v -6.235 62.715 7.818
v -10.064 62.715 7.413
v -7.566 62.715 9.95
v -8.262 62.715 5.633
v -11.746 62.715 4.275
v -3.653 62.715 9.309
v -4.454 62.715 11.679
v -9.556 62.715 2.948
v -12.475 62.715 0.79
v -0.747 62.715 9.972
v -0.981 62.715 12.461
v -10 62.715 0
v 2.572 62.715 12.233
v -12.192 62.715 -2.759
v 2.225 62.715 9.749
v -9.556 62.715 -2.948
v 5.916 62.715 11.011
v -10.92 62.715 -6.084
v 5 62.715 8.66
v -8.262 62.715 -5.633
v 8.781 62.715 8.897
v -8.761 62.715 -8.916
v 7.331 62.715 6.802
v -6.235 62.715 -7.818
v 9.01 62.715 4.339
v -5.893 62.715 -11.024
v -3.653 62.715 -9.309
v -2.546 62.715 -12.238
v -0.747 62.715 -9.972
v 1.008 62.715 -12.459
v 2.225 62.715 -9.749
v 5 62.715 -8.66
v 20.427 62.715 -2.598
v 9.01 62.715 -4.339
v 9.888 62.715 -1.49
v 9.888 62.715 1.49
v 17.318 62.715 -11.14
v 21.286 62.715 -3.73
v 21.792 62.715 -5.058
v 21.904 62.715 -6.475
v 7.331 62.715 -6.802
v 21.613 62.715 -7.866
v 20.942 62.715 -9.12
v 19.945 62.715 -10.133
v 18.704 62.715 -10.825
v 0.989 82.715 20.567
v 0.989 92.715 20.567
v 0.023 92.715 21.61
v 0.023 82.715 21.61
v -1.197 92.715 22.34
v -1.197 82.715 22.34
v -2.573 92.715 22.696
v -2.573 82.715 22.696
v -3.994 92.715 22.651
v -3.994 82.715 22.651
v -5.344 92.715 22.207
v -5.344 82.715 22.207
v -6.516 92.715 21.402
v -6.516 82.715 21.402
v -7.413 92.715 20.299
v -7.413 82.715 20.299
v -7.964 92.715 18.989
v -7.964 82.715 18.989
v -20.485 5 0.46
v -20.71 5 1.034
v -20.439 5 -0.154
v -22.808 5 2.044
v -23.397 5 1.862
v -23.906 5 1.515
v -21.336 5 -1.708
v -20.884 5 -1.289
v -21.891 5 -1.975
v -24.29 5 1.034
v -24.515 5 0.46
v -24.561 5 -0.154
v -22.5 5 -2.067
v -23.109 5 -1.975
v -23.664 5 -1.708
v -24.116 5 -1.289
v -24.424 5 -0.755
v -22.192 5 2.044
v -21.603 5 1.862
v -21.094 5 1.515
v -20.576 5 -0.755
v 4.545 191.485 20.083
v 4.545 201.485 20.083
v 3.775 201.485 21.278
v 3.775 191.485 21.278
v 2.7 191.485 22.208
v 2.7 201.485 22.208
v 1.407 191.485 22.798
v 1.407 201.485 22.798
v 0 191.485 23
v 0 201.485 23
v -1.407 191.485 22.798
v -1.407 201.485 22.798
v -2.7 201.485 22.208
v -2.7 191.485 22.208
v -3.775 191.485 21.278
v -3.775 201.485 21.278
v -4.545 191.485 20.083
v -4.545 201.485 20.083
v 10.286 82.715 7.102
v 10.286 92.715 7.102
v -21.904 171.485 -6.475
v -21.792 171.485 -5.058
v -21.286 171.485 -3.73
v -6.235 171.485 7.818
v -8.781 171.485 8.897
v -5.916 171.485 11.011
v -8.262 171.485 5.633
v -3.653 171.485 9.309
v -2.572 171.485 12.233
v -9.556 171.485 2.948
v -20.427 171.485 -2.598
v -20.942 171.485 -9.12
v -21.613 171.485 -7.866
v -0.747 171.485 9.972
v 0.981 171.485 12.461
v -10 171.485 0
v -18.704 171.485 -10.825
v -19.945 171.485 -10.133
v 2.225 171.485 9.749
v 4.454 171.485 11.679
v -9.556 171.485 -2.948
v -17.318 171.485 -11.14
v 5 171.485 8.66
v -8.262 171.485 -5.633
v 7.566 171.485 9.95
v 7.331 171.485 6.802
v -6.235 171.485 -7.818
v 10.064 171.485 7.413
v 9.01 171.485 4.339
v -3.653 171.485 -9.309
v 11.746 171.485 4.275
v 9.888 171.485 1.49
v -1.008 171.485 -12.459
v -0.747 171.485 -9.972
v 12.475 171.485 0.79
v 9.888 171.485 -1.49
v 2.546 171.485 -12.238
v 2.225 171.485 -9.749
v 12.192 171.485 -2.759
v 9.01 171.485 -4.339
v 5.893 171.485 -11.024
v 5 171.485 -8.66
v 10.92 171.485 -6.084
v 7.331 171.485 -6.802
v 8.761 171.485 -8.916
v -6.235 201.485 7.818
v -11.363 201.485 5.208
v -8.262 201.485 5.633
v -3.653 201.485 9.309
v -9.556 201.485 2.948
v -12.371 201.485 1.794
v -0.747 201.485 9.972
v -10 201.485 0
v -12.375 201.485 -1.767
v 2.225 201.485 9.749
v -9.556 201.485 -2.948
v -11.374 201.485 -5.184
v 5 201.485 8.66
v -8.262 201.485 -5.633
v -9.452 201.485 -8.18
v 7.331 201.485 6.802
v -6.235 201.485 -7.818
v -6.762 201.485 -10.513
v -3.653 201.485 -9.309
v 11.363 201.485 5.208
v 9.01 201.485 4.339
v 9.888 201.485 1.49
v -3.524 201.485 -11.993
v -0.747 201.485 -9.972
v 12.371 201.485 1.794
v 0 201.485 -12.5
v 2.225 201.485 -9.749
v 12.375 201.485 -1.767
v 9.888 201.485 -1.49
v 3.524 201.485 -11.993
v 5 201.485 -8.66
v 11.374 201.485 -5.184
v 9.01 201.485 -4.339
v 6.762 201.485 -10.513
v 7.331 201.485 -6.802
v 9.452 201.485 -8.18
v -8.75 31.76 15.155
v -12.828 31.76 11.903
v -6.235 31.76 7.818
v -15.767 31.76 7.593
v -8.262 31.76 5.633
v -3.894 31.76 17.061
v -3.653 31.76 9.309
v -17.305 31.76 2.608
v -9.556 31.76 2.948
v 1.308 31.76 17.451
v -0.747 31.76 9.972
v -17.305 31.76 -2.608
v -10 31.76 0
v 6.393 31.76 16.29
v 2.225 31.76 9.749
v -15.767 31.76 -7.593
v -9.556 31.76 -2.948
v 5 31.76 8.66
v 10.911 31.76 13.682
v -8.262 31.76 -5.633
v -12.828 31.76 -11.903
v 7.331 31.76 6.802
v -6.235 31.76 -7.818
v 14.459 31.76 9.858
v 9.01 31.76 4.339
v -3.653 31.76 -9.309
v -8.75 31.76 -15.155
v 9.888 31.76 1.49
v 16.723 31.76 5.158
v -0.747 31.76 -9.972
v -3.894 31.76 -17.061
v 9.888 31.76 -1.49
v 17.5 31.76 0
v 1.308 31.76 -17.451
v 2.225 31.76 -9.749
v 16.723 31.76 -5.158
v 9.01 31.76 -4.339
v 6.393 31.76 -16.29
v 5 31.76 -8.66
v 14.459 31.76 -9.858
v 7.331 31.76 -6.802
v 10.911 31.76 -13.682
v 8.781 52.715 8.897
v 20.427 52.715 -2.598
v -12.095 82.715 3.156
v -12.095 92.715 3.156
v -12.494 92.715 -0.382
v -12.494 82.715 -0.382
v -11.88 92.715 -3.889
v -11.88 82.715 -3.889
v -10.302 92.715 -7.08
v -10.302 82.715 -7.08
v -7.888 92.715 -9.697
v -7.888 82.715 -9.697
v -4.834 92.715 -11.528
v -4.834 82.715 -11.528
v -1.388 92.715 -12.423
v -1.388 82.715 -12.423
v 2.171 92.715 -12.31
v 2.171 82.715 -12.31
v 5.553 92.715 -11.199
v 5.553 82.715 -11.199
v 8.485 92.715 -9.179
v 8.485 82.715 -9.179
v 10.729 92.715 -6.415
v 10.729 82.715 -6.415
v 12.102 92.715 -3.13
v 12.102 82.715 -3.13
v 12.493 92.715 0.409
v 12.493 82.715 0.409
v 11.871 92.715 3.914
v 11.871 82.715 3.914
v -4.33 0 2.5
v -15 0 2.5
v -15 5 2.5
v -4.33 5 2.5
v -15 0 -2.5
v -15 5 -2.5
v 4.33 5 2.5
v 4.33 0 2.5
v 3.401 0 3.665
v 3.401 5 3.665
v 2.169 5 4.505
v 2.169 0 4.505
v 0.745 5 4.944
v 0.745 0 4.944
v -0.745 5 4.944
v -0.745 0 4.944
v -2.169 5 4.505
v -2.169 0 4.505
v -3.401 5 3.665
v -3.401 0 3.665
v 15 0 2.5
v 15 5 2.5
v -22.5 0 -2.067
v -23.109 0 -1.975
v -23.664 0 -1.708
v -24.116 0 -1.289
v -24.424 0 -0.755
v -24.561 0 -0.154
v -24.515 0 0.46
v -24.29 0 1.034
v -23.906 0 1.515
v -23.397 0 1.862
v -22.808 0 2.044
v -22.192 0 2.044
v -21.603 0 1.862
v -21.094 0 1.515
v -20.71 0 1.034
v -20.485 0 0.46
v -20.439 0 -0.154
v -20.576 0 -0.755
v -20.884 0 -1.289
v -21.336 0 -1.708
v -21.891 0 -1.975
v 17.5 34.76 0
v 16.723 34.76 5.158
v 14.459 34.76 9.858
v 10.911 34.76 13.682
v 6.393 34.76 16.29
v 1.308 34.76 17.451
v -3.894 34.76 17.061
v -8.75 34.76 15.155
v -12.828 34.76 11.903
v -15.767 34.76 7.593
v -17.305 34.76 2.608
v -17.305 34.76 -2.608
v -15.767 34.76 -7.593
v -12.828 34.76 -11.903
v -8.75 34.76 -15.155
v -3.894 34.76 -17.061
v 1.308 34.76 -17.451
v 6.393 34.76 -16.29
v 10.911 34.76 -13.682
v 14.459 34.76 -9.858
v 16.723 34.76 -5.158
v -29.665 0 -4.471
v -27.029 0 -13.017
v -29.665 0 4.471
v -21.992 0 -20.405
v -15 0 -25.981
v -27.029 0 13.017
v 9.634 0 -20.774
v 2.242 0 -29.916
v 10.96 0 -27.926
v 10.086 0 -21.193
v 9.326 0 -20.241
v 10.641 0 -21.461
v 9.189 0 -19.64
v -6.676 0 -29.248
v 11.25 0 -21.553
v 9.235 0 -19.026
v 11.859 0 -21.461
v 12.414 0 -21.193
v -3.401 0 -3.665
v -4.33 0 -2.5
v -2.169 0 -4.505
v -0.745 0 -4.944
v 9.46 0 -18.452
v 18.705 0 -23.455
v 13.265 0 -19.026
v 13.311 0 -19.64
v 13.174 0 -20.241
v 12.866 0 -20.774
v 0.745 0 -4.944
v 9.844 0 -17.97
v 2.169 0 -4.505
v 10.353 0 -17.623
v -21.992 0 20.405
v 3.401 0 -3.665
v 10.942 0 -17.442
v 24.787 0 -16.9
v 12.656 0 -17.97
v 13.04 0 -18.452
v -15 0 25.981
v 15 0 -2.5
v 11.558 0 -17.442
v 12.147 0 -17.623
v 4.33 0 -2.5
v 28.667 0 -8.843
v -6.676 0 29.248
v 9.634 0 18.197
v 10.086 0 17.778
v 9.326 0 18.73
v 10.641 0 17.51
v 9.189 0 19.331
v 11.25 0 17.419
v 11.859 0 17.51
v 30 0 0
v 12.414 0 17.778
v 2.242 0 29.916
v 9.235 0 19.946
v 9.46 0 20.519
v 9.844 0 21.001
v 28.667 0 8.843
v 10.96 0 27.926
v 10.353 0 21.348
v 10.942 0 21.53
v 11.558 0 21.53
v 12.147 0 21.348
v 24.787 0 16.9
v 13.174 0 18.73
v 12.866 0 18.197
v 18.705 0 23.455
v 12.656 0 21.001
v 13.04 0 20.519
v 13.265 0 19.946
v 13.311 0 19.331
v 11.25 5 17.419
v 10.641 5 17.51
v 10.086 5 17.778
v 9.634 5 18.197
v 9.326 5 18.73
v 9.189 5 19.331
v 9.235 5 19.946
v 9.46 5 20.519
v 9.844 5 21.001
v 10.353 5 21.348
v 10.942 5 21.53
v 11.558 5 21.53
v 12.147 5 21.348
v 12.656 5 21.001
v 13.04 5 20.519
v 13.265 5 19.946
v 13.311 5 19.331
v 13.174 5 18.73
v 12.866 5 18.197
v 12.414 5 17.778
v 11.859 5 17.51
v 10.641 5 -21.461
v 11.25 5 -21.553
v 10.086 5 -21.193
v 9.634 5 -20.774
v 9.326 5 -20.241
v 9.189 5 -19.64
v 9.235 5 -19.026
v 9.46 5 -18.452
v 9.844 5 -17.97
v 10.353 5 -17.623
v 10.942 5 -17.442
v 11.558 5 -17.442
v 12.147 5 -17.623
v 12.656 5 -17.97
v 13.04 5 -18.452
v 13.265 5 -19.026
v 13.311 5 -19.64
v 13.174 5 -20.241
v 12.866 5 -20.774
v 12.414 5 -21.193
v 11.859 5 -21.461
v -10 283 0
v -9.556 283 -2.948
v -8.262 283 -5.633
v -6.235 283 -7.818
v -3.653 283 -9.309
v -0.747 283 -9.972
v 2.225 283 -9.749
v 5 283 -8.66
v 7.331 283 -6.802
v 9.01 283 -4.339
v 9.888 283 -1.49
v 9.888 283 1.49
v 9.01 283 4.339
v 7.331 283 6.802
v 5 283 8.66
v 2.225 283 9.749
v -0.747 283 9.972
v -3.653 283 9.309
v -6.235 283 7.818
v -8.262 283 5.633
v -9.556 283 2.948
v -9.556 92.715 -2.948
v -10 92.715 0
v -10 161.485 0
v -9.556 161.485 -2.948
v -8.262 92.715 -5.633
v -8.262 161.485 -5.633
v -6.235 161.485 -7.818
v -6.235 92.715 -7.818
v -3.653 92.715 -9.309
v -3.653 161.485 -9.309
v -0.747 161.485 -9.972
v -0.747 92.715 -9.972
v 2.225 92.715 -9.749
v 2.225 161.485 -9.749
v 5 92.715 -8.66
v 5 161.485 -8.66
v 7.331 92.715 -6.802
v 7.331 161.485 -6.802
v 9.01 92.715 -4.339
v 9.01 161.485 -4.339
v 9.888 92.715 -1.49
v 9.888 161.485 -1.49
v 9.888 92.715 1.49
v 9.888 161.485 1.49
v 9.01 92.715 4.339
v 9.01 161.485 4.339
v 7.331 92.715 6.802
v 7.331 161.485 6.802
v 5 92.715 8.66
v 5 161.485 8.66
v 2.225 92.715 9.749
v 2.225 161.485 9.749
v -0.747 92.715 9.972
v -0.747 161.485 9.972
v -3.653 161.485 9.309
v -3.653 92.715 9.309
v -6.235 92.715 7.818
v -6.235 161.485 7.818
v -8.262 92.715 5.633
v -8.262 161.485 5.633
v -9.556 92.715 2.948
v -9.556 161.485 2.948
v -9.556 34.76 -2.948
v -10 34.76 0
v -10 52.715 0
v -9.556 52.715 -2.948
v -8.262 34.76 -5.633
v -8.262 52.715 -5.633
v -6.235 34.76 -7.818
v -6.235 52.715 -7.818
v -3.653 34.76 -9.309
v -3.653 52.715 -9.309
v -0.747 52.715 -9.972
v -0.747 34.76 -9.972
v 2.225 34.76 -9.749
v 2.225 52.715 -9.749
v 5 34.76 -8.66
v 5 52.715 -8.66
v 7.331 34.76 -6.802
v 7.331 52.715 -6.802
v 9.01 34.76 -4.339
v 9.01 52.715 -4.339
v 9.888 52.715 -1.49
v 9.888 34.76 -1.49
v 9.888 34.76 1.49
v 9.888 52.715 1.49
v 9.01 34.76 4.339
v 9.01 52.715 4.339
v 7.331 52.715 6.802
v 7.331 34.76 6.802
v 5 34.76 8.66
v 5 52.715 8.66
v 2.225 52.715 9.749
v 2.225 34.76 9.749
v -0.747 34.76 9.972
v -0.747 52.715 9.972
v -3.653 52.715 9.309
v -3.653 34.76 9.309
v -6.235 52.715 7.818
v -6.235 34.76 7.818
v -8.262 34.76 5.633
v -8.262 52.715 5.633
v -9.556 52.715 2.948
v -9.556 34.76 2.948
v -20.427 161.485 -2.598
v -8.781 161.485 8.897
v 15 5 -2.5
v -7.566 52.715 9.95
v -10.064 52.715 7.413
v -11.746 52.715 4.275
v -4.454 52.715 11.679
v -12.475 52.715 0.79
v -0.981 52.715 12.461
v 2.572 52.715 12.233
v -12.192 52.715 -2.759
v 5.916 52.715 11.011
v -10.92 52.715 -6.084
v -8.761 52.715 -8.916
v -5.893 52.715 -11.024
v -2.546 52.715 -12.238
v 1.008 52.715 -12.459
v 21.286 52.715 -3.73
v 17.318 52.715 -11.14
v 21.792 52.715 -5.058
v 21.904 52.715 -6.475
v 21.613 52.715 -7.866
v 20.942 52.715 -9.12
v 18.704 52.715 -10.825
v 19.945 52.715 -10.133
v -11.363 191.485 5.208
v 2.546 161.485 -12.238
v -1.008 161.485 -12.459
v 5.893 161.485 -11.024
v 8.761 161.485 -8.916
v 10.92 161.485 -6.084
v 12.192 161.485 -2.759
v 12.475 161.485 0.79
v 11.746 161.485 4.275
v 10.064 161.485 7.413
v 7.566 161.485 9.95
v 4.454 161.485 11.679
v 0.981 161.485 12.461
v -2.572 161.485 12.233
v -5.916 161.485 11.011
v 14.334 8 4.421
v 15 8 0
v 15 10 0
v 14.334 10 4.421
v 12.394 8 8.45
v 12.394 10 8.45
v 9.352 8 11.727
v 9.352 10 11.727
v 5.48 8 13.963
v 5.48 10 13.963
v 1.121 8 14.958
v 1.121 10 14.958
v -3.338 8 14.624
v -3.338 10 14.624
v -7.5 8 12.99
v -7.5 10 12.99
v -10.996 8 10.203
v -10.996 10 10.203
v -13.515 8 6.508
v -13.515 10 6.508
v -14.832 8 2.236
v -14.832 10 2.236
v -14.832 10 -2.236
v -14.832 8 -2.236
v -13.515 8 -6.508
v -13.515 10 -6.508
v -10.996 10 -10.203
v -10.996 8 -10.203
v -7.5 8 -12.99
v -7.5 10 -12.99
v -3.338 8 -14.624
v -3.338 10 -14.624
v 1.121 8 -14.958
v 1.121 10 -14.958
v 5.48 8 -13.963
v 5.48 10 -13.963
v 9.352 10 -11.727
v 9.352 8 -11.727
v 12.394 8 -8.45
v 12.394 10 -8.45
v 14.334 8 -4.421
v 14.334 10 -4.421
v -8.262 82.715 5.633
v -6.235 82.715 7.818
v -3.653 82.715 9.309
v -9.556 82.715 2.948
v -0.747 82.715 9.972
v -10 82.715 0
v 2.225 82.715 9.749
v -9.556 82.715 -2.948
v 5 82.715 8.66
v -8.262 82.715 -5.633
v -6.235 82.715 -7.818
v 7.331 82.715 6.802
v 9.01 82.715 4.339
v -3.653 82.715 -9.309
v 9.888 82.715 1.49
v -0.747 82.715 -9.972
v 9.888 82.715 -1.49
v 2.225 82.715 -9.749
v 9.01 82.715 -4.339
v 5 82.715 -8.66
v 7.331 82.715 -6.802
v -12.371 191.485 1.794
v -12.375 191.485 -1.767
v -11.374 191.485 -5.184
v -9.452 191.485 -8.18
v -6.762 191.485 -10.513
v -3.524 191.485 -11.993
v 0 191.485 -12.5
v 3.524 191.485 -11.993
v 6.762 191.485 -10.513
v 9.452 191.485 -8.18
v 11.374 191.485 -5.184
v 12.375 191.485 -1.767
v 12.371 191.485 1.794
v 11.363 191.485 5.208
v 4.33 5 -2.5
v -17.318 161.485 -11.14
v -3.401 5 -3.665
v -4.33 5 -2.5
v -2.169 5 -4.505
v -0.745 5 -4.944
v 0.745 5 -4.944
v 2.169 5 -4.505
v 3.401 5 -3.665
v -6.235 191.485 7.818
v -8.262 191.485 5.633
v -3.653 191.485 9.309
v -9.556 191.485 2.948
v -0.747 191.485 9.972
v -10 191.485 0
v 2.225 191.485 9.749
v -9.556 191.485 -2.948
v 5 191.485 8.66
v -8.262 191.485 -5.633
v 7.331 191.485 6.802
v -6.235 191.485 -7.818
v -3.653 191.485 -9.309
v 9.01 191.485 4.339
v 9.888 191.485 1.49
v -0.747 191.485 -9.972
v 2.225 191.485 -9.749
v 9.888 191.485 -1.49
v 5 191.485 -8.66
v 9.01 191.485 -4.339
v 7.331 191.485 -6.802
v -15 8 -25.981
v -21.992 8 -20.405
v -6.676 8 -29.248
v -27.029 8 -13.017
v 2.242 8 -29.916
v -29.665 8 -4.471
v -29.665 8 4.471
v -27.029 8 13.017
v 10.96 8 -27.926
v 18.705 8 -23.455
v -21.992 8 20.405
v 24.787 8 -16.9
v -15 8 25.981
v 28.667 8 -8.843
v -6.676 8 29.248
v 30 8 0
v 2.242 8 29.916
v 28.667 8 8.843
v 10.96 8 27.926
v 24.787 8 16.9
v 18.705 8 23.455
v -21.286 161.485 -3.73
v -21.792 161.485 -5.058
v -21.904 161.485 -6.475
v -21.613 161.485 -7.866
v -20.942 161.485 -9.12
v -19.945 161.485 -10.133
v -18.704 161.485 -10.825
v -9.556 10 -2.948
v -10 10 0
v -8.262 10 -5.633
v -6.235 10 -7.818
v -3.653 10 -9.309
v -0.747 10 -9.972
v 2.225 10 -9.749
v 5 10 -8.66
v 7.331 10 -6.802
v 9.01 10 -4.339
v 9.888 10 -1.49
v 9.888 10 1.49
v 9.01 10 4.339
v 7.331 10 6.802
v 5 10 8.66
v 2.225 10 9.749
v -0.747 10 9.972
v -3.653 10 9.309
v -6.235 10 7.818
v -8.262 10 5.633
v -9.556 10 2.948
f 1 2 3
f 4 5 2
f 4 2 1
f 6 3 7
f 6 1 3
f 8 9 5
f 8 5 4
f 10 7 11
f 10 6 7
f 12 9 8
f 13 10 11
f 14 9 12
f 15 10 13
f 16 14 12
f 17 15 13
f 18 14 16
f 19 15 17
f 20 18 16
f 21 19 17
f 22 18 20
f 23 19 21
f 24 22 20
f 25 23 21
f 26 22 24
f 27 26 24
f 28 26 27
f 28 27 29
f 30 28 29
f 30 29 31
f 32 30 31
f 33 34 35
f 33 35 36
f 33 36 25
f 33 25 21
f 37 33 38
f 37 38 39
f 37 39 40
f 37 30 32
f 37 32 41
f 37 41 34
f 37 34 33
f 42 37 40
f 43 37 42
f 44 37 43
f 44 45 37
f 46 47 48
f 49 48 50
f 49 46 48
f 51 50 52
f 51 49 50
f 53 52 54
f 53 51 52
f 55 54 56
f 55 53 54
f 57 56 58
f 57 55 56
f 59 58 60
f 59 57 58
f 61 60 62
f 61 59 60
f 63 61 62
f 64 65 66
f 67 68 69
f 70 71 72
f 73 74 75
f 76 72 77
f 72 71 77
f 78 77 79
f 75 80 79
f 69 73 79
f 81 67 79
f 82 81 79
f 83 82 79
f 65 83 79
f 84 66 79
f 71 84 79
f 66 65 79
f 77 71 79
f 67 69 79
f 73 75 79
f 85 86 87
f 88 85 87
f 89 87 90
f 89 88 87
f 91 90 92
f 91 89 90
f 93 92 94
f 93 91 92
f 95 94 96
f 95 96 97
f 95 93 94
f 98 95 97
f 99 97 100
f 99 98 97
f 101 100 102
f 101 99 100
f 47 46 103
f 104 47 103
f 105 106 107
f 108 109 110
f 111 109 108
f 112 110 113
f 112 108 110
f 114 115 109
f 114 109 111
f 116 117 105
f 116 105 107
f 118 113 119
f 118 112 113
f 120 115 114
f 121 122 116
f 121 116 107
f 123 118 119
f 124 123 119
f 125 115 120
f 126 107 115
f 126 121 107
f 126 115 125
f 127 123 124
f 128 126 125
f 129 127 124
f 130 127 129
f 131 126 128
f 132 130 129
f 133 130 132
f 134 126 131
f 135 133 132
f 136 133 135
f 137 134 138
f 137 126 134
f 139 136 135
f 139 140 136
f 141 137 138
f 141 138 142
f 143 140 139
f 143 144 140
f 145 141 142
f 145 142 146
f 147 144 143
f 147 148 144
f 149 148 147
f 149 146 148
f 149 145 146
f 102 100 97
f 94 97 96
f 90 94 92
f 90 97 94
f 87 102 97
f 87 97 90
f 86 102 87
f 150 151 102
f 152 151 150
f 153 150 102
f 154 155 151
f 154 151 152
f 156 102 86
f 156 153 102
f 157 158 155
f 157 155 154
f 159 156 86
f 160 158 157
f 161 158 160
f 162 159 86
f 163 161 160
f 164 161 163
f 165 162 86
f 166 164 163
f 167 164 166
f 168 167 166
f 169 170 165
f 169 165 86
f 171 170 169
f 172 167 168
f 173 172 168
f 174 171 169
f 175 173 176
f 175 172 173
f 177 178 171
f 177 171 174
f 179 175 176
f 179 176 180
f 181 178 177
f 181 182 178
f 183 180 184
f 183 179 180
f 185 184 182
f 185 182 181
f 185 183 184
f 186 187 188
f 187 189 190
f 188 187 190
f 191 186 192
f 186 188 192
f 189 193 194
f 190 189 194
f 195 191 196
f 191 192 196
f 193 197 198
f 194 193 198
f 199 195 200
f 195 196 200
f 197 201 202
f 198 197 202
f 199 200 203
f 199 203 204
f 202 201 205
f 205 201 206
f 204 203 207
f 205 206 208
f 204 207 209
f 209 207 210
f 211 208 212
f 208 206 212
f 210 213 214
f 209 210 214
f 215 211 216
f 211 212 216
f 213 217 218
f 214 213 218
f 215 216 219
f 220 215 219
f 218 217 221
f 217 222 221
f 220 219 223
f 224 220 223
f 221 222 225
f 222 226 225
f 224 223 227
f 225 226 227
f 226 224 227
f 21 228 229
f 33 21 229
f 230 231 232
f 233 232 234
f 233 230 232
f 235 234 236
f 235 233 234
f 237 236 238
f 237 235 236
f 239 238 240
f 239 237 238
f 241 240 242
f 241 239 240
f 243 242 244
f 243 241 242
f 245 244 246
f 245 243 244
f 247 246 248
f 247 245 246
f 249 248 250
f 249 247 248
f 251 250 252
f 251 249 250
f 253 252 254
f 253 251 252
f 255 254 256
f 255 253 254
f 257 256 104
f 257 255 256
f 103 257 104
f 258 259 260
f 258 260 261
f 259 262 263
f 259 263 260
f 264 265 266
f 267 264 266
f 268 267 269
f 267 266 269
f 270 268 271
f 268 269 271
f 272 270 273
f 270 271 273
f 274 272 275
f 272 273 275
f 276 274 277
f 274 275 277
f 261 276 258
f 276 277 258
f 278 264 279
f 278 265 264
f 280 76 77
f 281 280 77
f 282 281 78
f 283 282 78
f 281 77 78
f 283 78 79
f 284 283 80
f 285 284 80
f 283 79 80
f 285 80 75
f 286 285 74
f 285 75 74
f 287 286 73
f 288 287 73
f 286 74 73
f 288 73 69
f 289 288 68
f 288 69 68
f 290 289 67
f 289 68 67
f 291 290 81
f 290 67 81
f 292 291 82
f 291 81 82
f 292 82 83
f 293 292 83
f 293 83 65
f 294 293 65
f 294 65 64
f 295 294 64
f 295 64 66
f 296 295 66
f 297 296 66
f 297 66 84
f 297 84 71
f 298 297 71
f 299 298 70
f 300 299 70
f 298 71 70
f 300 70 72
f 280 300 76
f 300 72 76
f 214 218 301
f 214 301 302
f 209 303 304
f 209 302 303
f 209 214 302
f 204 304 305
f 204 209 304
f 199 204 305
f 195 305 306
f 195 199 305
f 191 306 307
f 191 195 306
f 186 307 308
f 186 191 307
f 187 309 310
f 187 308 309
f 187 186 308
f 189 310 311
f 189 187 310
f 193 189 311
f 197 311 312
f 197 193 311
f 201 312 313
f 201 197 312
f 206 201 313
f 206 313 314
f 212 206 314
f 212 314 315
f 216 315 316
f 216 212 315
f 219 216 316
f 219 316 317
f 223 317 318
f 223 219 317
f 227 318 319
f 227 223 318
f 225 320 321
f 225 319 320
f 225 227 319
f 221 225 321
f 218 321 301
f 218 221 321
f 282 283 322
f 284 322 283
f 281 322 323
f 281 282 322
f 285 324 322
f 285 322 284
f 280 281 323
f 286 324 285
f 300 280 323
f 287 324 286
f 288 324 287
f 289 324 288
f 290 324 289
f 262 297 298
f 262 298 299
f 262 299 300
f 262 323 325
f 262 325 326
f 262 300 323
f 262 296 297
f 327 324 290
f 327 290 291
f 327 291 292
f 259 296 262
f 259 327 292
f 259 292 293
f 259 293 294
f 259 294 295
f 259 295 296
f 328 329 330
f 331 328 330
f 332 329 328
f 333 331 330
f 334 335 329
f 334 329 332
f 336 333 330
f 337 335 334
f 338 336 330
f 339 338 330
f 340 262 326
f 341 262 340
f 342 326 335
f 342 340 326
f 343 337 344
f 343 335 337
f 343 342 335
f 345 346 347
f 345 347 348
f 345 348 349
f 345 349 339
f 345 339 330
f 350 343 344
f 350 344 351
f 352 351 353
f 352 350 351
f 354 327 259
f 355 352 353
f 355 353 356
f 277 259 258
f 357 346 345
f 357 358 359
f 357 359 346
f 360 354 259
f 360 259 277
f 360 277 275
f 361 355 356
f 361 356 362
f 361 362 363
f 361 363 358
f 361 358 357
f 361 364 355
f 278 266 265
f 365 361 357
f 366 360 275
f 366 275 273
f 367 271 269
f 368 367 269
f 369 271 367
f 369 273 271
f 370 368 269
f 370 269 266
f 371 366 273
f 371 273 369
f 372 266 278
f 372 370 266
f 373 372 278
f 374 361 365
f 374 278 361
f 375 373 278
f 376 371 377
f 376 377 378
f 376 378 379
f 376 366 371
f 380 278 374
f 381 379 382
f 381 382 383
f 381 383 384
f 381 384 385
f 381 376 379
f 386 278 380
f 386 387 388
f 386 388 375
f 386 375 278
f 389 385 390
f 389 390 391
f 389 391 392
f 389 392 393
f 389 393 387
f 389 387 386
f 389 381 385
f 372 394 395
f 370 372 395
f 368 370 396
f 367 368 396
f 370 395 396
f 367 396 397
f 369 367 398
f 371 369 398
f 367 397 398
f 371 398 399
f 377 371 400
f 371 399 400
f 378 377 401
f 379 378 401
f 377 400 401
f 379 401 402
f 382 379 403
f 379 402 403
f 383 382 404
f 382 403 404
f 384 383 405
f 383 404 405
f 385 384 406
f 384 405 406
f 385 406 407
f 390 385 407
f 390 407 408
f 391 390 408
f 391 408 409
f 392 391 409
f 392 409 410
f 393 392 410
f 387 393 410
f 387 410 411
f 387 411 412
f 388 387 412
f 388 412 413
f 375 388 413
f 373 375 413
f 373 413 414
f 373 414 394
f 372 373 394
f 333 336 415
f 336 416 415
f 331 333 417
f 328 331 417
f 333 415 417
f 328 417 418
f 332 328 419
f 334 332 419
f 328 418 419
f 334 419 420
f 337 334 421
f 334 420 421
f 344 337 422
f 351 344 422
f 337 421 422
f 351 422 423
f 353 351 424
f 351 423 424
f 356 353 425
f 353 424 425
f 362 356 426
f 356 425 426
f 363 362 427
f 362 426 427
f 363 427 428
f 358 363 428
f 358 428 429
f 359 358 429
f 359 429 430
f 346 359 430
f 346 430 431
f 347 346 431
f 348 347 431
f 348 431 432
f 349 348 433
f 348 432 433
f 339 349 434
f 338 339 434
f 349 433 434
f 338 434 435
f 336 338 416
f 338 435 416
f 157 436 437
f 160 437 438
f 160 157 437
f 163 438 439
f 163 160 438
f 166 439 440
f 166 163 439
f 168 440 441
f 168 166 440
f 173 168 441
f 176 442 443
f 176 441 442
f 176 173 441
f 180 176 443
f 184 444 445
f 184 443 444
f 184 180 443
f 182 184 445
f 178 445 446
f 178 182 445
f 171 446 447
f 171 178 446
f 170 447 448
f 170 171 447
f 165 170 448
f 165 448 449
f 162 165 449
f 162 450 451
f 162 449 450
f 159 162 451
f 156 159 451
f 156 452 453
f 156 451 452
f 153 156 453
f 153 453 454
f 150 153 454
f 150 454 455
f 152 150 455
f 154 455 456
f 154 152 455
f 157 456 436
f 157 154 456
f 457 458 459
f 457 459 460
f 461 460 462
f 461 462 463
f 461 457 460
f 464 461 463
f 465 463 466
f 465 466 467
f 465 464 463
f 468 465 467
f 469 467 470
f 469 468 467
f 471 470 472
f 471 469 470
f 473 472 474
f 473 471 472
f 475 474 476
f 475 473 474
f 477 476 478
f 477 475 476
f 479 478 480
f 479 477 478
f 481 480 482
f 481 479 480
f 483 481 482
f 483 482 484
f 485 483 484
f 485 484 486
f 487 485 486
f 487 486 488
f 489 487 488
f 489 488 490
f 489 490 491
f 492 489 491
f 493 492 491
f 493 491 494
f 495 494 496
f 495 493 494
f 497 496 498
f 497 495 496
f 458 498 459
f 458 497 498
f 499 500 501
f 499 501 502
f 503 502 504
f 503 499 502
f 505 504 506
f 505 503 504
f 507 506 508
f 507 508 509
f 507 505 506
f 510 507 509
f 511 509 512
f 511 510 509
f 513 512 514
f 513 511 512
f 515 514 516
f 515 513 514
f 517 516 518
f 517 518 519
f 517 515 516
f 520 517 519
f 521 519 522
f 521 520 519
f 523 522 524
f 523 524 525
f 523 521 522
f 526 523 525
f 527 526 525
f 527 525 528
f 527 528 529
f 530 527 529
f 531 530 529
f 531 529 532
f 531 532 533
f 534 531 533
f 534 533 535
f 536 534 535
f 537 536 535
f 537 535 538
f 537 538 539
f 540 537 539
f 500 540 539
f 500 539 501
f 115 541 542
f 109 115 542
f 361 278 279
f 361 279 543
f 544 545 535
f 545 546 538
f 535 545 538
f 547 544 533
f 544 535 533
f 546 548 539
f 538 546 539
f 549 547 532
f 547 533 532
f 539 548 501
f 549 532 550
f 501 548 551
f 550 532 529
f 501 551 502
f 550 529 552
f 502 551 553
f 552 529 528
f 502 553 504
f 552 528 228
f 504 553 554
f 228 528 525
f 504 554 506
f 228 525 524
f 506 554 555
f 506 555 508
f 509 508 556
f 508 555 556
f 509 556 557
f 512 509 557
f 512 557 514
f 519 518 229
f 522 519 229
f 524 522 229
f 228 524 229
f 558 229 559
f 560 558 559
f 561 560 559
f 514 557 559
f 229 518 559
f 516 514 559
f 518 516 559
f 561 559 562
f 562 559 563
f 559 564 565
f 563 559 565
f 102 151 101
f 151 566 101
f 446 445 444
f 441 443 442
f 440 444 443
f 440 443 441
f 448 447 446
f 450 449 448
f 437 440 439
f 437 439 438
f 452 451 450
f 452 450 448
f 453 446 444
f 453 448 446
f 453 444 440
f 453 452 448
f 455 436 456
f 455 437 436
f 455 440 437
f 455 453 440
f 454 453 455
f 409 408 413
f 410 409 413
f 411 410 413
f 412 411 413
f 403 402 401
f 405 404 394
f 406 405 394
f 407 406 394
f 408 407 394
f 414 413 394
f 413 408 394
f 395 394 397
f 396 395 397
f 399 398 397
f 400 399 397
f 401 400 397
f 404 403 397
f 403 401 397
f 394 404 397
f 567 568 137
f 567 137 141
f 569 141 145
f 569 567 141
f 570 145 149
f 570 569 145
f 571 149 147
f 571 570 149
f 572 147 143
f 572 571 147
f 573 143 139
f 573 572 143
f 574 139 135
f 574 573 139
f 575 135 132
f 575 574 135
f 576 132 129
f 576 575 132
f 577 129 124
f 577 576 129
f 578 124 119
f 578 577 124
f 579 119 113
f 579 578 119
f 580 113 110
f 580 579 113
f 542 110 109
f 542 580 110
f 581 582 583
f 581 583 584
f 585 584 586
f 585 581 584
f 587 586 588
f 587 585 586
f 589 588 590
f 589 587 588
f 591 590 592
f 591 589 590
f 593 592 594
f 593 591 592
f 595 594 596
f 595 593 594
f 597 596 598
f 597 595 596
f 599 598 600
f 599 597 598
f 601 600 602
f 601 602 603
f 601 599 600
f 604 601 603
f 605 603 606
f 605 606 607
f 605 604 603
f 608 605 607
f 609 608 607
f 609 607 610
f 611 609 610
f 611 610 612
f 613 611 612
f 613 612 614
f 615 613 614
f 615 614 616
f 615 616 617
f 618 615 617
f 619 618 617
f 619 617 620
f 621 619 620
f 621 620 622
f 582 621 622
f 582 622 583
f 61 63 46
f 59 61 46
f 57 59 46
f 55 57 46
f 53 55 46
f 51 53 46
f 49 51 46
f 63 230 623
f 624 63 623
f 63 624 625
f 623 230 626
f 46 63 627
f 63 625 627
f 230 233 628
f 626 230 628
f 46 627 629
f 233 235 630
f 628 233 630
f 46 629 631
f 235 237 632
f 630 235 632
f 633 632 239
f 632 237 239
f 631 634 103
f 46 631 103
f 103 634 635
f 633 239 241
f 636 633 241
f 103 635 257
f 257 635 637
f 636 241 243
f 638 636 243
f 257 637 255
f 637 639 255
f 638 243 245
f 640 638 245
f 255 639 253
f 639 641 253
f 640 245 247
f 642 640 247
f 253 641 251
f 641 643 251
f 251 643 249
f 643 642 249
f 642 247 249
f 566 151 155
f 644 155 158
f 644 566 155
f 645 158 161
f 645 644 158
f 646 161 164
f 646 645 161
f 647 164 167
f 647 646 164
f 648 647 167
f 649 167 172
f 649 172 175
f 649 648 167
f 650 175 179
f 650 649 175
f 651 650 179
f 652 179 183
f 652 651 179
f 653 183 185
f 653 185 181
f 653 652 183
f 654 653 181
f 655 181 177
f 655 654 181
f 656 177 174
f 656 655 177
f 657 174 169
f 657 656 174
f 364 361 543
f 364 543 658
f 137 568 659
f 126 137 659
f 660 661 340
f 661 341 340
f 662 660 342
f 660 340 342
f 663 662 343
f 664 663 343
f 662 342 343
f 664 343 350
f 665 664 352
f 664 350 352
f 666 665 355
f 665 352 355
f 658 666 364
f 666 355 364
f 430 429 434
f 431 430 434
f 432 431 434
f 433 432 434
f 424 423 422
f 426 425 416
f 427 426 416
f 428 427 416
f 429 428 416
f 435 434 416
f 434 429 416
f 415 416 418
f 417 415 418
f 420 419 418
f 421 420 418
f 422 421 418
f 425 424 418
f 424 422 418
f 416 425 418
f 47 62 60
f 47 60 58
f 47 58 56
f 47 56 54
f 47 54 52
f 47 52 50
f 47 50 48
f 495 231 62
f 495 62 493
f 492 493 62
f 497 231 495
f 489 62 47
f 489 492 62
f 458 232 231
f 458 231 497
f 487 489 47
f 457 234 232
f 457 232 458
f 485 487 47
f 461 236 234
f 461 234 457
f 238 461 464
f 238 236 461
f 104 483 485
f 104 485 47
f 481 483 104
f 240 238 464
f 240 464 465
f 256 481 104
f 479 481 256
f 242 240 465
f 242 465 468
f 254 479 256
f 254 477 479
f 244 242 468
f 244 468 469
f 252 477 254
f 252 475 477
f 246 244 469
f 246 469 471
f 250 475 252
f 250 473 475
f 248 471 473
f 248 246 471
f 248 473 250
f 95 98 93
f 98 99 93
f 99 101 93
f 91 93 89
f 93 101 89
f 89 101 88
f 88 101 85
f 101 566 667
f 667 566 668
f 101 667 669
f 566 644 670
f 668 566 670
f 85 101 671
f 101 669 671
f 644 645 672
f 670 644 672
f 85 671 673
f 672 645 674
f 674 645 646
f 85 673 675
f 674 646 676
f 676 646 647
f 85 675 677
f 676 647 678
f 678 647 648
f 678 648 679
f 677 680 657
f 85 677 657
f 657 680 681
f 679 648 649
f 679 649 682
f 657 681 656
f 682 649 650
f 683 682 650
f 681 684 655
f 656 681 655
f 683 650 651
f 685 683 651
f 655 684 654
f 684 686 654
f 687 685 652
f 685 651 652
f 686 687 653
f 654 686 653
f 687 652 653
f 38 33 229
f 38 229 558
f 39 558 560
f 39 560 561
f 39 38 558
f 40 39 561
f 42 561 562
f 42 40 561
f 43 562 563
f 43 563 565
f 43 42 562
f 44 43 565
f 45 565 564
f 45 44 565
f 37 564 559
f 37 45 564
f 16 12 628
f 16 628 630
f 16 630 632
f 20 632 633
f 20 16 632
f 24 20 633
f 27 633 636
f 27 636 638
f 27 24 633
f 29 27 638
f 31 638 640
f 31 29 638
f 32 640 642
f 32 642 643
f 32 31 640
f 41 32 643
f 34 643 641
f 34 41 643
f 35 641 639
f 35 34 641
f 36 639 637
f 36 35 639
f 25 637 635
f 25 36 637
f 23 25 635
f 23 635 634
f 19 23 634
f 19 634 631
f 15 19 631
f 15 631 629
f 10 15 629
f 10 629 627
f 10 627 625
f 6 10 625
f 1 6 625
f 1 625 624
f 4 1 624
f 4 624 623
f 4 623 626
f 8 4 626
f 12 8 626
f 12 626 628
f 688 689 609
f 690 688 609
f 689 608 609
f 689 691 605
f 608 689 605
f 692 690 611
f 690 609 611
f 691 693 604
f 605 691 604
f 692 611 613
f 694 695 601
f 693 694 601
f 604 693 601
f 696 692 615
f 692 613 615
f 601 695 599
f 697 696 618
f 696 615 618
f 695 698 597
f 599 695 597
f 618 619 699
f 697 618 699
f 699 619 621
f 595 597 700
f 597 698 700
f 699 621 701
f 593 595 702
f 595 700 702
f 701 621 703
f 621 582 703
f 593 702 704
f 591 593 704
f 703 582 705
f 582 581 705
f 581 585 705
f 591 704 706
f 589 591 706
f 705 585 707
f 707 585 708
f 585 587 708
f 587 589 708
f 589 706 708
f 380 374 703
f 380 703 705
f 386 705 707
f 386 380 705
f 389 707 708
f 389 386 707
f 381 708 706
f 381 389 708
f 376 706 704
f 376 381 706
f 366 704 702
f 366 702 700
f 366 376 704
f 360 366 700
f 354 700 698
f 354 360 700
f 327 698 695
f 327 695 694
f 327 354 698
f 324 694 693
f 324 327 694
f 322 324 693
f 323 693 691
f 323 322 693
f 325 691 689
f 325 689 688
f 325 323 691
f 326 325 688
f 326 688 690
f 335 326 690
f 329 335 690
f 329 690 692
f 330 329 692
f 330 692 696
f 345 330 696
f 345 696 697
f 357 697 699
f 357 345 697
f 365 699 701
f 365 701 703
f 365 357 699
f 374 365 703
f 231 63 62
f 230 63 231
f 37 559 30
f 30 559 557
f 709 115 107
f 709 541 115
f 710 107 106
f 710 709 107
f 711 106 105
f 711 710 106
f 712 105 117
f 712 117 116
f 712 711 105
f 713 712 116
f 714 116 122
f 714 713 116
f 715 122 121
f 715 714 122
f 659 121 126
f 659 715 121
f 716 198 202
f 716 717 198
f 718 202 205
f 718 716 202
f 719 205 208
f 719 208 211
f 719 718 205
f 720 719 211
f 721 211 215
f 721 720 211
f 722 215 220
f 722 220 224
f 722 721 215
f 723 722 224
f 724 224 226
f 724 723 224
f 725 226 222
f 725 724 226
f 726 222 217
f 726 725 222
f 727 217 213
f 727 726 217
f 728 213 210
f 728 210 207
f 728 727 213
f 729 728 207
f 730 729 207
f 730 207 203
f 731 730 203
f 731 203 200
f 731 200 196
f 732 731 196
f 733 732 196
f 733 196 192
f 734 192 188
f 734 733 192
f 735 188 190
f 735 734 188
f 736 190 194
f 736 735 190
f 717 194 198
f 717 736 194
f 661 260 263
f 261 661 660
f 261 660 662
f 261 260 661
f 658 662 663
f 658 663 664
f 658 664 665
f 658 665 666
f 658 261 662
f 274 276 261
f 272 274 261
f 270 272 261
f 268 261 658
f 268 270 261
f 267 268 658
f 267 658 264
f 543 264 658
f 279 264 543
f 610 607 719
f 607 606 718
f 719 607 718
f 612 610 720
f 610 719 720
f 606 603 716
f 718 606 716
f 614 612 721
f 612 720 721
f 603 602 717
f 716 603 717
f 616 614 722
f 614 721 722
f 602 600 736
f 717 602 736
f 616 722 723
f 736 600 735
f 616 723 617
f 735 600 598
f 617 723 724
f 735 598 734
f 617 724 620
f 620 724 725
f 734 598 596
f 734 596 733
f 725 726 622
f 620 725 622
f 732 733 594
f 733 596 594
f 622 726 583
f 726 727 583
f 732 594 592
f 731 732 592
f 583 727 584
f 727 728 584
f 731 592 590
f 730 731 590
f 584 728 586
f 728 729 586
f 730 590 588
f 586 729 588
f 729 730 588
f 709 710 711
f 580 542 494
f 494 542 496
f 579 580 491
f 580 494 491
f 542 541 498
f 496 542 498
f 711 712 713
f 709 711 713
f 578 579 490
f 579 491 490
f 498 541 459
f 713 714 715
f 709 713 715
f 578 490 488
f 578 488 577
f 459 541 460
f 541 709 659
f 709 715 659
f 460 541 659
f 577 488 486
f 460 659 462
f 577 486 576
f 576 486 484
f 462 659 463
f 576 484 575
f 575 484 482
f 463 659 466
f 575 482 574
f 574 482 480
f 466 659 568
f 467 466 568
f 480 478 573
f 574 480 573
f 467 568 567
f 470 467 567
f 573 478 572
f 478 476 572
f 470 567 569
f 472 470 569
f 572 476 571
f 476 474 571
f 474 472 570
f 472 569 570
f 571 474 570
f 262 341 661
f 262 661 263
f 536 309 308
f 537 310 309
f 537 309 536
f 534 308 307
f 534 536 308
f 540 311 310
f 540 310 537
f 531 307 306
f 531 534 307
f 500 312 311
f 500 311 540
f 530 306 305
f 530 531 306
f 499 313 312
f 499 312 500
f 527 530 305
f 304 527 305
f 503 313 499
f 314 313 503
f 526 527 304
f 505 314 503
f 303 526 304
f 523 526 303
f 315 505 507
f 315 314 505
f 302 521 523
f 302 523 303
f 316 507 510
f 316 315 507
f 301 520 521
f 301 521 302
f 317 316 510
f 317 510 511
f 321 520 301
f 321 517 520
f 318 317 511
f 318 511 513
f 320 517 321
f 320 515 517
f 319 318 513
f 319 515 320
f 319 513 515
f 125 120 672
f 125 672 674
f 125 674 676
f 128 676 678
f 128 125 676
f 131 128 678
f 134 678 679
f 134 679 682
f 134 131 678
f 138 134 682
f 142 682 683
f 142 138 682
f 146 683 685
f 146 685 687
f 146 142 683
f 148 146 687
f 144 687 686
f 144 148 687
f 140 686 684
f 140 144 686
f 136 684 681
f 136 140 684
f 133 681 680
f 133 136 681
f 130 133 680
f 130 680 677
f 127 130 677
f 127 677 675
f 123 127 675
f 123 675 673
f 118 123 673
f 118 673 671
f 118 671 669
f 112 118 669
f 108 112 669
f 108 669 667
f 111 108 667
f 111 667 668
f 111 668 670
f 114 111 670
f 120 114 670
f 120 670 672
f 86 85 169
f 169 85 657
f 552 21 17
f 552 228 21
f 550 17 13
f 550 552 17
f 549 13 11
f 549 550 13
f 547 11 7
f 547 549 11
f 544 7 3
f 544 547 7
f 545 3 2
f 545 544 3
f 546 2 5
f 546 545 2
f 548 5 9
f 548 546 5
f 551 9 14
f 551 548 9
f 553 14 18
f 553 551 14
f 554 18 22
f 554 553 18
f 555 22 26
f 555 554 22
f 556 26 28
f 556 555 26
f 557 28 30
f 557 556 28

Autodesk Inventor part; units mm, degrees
sketch "Sketch1" plane through (0, 0, 0) normal (0, 1, 0) x (-1, 0, 0)
  circle A0 centre (0, 0) radius 10
  dimension "d2" = 20
extrude "Extrusion1" add sketch "Sketch1" along normal blind 283
ref_plane "Work Plane1" through (0, 181.485, 0) normal (0, 1, 0) x (1, 0, 0)
ref_plane "Work Plane2" through (0, 196.485, 0) normal (0, 1, 0) x (1, 0, 0)
ref_plane "Work Plane3" through (0, 166.485, 0) normal (0, 1, 0) x (1, 0, 0)
sketch "Sketch2" plane through (0, 196.485, 0) normal (0, 1, 0) x (1, 0, 0)
  circle A0 centre (0, 0) radius 12.5
  line L0 (-11.3632, -5.2083) -> (0, -30)
  line L1 (0, -30) -> (11.3632, -5.2083)
  dimension "d6" = 25
  dimension "d7" = 30
extrude "Extrusion2" add sketch "Sketch2" along normal mid plane 10
sketch "Sketch4" plane through (0, 166.485, 0) normal (0, 1, 0) x (1, 0, 0)
  circle A0 centre (0, 0) radius 12.5
  line L0 (0, -30) -> (11.3632, -5.2083) construction
  line L1 (0, 0) -> (0, -30) construction
  line L2 (0, 0) -> (-28.1908, 10.2606) construction
  line L3 (-1.0078, 12.4593) -> (-28.1908, 10.2606)
  line L4 (-28.1908, 10.2606) -> (-8.7807, -8.8966)
  point P0 (0, -12.5552)
  point P1 (0, -12.5)
  point P2 (6.0758, -7.9426)
  point P3 (10.4096, -7.2889)
  point P4 (0, -12.5552)
  dimension "d10" = 25
  dimension "d12" = 30
  dimension "d19" = 250
extrude "Extrusion3" add sketch "Sketch4" along normal mid plane 10
ref_plane "Work Plane4" through (0, 72.715, 0) normal (0, 1, 0) x (1, 0, 0)
ref_plane "Work Plane5" through (0, 87.715, 0) normal (0, 1, 0) x (1, 0, 0)
ref_plane "Work Plane6" through (0, 57.715, 0) normal (0, 1, 0) x (1, 0, 0)
fillet "Fillet1" radius 5 2 edges at (-28.1908, 166.485, -10.2606) (0, 196.485, 30)
sketch "Sketch5" plane through (0, 87.715, 0) normal (0, 1, 0) x (1, 0, 0)
  circle A0 centre (0, 0) radius 12.5
  arc A1 (-4.5453, -20.0833) -> (4.5453, -20.0833) centre (0, -18) ccw projected
  line L0 (0, 0) -> (0, -18) construction
  line L1 (0, 0) -> (-5.2094, -29.5442) construction
  line L2 (-5.2094, -29.5442) -> (-12.095, -3.156)
  line L3 (-5.2094, -29.5442) -> (10.2862, -7.1024)
  dimension "d21" = 25
  dimension "d22" = 10
  dimension "d23" = 30
extrude "Extrusion4" add sketch "Sketch5" along normal mid plane 10
sketch "Sketch6" plane through (0, 57.715, 0) normal (0, 1, 0) x (1, 0, 0)
  circle A0 centre (0, 0) radius 12.5
  line L0 (-8.7807, -8.8966) -> (-20.4267, 2.5977) projected
  line L1 (8.7807, -8.8966) -> (28.1908, 10.2606)
  line L2 (28.1908, 10.2606) -> (1.0078, 12.4593)
  line L3 (0, 0) -> (0, -18) construction
  line L4 (28.1908, 10.2606) -> (0, 0) construction
  dimension "d26" = 25
  dimension "d27" = 18
  dimension "d28" = 30
  dimension "d29" = 250
extrude "Extrusion5" add sketch "Sketch6" along normal mid plane 10
fillet "Fillet2" radius 5 2 edges at (28.1908, 57.715, -10.2606) (-5.2094, 87.715, 29.5442)
sketch "Sketch7" plane through (0, 0, 0) normal (0, -1, 0) x (1, 0, 0)
  circle A0 centre (0, 0) radius 15
  circle A1 centre (0, 0) radius 30
  dimension "d33" = 30
  dimension "d34" = 60
extrude "Extrusion6" add sketch "Sketch7" against normal blind 8
extrude "Extrusion7" add sketch "Sketch7" against normal blind 10 contours A0
sketch "Sketch8" plane through (0, 0, 0) normal (0, -1, 0) x (1, 0, 0)
  line L0 (15, -2.5) -> (-15, -2.5)
  line L1 (-15, -2.5) -> (-15, 2.5)
  line L2 (-15, 2.5) -> (15, 2.5)
  line L3 (15, 2.5) -> (15, -2.5)
  line L4 (15, -2.5) -> (-15, 2.5) construction
  line L5 (-15, -2.5) -> (15, 2.5) construction
  circle A0 centre (0, 0) radius 22.5
  circle A1 centre (0, 0) radius 5
  point P0 (-22.5, 0)
  point P1 (11.25, -19.4856)
  point P2 (11.25, 19.4856)
  point P3 (4.3301, 2.5)
  point P4 (-4.3301, 2.5)
  point P5 (-4.3301, -2.5)
  point P6 (4.3301, -2.5)
  dimension "d43" = 45
  dimension "d41" = 360
  dimension "d44" = 5
  dimension "d45" = 30
  dimension "d48" = 10
extrude "Extrusion8" cut sketch "Sketch8" against normal blind 5 contours L0 A1 L2 L3 | A1 L0 | L0 A1 L2 | L0 L1 L2 A1 | L2 A1
hole "Hole1" at (-22.5, 0, 0) at (11.25, 0, -19.4856) at (11.25, 0, 19.4856) direction (0, 1, 0) diameter 4.134 depth 5 thread size "M5x0.8" class "6H" standard "ISO Metric profile"
ref_plane "Work Plane7" through (0, 31.76, 0) normal (0, 1, 0) x (1, 0, 0)
sketch "Sketch9" plane through (0, 31.76, 0) normal (0, 1, 0) x (1, 0, 0)
  circle A0 centre (0, 0) radius 17.5
  dimension "d57" = 35
extrude "Extrusion9" add sketch "Sketch9" along normal blind 3
properties part number "Wałek rozrządu"
